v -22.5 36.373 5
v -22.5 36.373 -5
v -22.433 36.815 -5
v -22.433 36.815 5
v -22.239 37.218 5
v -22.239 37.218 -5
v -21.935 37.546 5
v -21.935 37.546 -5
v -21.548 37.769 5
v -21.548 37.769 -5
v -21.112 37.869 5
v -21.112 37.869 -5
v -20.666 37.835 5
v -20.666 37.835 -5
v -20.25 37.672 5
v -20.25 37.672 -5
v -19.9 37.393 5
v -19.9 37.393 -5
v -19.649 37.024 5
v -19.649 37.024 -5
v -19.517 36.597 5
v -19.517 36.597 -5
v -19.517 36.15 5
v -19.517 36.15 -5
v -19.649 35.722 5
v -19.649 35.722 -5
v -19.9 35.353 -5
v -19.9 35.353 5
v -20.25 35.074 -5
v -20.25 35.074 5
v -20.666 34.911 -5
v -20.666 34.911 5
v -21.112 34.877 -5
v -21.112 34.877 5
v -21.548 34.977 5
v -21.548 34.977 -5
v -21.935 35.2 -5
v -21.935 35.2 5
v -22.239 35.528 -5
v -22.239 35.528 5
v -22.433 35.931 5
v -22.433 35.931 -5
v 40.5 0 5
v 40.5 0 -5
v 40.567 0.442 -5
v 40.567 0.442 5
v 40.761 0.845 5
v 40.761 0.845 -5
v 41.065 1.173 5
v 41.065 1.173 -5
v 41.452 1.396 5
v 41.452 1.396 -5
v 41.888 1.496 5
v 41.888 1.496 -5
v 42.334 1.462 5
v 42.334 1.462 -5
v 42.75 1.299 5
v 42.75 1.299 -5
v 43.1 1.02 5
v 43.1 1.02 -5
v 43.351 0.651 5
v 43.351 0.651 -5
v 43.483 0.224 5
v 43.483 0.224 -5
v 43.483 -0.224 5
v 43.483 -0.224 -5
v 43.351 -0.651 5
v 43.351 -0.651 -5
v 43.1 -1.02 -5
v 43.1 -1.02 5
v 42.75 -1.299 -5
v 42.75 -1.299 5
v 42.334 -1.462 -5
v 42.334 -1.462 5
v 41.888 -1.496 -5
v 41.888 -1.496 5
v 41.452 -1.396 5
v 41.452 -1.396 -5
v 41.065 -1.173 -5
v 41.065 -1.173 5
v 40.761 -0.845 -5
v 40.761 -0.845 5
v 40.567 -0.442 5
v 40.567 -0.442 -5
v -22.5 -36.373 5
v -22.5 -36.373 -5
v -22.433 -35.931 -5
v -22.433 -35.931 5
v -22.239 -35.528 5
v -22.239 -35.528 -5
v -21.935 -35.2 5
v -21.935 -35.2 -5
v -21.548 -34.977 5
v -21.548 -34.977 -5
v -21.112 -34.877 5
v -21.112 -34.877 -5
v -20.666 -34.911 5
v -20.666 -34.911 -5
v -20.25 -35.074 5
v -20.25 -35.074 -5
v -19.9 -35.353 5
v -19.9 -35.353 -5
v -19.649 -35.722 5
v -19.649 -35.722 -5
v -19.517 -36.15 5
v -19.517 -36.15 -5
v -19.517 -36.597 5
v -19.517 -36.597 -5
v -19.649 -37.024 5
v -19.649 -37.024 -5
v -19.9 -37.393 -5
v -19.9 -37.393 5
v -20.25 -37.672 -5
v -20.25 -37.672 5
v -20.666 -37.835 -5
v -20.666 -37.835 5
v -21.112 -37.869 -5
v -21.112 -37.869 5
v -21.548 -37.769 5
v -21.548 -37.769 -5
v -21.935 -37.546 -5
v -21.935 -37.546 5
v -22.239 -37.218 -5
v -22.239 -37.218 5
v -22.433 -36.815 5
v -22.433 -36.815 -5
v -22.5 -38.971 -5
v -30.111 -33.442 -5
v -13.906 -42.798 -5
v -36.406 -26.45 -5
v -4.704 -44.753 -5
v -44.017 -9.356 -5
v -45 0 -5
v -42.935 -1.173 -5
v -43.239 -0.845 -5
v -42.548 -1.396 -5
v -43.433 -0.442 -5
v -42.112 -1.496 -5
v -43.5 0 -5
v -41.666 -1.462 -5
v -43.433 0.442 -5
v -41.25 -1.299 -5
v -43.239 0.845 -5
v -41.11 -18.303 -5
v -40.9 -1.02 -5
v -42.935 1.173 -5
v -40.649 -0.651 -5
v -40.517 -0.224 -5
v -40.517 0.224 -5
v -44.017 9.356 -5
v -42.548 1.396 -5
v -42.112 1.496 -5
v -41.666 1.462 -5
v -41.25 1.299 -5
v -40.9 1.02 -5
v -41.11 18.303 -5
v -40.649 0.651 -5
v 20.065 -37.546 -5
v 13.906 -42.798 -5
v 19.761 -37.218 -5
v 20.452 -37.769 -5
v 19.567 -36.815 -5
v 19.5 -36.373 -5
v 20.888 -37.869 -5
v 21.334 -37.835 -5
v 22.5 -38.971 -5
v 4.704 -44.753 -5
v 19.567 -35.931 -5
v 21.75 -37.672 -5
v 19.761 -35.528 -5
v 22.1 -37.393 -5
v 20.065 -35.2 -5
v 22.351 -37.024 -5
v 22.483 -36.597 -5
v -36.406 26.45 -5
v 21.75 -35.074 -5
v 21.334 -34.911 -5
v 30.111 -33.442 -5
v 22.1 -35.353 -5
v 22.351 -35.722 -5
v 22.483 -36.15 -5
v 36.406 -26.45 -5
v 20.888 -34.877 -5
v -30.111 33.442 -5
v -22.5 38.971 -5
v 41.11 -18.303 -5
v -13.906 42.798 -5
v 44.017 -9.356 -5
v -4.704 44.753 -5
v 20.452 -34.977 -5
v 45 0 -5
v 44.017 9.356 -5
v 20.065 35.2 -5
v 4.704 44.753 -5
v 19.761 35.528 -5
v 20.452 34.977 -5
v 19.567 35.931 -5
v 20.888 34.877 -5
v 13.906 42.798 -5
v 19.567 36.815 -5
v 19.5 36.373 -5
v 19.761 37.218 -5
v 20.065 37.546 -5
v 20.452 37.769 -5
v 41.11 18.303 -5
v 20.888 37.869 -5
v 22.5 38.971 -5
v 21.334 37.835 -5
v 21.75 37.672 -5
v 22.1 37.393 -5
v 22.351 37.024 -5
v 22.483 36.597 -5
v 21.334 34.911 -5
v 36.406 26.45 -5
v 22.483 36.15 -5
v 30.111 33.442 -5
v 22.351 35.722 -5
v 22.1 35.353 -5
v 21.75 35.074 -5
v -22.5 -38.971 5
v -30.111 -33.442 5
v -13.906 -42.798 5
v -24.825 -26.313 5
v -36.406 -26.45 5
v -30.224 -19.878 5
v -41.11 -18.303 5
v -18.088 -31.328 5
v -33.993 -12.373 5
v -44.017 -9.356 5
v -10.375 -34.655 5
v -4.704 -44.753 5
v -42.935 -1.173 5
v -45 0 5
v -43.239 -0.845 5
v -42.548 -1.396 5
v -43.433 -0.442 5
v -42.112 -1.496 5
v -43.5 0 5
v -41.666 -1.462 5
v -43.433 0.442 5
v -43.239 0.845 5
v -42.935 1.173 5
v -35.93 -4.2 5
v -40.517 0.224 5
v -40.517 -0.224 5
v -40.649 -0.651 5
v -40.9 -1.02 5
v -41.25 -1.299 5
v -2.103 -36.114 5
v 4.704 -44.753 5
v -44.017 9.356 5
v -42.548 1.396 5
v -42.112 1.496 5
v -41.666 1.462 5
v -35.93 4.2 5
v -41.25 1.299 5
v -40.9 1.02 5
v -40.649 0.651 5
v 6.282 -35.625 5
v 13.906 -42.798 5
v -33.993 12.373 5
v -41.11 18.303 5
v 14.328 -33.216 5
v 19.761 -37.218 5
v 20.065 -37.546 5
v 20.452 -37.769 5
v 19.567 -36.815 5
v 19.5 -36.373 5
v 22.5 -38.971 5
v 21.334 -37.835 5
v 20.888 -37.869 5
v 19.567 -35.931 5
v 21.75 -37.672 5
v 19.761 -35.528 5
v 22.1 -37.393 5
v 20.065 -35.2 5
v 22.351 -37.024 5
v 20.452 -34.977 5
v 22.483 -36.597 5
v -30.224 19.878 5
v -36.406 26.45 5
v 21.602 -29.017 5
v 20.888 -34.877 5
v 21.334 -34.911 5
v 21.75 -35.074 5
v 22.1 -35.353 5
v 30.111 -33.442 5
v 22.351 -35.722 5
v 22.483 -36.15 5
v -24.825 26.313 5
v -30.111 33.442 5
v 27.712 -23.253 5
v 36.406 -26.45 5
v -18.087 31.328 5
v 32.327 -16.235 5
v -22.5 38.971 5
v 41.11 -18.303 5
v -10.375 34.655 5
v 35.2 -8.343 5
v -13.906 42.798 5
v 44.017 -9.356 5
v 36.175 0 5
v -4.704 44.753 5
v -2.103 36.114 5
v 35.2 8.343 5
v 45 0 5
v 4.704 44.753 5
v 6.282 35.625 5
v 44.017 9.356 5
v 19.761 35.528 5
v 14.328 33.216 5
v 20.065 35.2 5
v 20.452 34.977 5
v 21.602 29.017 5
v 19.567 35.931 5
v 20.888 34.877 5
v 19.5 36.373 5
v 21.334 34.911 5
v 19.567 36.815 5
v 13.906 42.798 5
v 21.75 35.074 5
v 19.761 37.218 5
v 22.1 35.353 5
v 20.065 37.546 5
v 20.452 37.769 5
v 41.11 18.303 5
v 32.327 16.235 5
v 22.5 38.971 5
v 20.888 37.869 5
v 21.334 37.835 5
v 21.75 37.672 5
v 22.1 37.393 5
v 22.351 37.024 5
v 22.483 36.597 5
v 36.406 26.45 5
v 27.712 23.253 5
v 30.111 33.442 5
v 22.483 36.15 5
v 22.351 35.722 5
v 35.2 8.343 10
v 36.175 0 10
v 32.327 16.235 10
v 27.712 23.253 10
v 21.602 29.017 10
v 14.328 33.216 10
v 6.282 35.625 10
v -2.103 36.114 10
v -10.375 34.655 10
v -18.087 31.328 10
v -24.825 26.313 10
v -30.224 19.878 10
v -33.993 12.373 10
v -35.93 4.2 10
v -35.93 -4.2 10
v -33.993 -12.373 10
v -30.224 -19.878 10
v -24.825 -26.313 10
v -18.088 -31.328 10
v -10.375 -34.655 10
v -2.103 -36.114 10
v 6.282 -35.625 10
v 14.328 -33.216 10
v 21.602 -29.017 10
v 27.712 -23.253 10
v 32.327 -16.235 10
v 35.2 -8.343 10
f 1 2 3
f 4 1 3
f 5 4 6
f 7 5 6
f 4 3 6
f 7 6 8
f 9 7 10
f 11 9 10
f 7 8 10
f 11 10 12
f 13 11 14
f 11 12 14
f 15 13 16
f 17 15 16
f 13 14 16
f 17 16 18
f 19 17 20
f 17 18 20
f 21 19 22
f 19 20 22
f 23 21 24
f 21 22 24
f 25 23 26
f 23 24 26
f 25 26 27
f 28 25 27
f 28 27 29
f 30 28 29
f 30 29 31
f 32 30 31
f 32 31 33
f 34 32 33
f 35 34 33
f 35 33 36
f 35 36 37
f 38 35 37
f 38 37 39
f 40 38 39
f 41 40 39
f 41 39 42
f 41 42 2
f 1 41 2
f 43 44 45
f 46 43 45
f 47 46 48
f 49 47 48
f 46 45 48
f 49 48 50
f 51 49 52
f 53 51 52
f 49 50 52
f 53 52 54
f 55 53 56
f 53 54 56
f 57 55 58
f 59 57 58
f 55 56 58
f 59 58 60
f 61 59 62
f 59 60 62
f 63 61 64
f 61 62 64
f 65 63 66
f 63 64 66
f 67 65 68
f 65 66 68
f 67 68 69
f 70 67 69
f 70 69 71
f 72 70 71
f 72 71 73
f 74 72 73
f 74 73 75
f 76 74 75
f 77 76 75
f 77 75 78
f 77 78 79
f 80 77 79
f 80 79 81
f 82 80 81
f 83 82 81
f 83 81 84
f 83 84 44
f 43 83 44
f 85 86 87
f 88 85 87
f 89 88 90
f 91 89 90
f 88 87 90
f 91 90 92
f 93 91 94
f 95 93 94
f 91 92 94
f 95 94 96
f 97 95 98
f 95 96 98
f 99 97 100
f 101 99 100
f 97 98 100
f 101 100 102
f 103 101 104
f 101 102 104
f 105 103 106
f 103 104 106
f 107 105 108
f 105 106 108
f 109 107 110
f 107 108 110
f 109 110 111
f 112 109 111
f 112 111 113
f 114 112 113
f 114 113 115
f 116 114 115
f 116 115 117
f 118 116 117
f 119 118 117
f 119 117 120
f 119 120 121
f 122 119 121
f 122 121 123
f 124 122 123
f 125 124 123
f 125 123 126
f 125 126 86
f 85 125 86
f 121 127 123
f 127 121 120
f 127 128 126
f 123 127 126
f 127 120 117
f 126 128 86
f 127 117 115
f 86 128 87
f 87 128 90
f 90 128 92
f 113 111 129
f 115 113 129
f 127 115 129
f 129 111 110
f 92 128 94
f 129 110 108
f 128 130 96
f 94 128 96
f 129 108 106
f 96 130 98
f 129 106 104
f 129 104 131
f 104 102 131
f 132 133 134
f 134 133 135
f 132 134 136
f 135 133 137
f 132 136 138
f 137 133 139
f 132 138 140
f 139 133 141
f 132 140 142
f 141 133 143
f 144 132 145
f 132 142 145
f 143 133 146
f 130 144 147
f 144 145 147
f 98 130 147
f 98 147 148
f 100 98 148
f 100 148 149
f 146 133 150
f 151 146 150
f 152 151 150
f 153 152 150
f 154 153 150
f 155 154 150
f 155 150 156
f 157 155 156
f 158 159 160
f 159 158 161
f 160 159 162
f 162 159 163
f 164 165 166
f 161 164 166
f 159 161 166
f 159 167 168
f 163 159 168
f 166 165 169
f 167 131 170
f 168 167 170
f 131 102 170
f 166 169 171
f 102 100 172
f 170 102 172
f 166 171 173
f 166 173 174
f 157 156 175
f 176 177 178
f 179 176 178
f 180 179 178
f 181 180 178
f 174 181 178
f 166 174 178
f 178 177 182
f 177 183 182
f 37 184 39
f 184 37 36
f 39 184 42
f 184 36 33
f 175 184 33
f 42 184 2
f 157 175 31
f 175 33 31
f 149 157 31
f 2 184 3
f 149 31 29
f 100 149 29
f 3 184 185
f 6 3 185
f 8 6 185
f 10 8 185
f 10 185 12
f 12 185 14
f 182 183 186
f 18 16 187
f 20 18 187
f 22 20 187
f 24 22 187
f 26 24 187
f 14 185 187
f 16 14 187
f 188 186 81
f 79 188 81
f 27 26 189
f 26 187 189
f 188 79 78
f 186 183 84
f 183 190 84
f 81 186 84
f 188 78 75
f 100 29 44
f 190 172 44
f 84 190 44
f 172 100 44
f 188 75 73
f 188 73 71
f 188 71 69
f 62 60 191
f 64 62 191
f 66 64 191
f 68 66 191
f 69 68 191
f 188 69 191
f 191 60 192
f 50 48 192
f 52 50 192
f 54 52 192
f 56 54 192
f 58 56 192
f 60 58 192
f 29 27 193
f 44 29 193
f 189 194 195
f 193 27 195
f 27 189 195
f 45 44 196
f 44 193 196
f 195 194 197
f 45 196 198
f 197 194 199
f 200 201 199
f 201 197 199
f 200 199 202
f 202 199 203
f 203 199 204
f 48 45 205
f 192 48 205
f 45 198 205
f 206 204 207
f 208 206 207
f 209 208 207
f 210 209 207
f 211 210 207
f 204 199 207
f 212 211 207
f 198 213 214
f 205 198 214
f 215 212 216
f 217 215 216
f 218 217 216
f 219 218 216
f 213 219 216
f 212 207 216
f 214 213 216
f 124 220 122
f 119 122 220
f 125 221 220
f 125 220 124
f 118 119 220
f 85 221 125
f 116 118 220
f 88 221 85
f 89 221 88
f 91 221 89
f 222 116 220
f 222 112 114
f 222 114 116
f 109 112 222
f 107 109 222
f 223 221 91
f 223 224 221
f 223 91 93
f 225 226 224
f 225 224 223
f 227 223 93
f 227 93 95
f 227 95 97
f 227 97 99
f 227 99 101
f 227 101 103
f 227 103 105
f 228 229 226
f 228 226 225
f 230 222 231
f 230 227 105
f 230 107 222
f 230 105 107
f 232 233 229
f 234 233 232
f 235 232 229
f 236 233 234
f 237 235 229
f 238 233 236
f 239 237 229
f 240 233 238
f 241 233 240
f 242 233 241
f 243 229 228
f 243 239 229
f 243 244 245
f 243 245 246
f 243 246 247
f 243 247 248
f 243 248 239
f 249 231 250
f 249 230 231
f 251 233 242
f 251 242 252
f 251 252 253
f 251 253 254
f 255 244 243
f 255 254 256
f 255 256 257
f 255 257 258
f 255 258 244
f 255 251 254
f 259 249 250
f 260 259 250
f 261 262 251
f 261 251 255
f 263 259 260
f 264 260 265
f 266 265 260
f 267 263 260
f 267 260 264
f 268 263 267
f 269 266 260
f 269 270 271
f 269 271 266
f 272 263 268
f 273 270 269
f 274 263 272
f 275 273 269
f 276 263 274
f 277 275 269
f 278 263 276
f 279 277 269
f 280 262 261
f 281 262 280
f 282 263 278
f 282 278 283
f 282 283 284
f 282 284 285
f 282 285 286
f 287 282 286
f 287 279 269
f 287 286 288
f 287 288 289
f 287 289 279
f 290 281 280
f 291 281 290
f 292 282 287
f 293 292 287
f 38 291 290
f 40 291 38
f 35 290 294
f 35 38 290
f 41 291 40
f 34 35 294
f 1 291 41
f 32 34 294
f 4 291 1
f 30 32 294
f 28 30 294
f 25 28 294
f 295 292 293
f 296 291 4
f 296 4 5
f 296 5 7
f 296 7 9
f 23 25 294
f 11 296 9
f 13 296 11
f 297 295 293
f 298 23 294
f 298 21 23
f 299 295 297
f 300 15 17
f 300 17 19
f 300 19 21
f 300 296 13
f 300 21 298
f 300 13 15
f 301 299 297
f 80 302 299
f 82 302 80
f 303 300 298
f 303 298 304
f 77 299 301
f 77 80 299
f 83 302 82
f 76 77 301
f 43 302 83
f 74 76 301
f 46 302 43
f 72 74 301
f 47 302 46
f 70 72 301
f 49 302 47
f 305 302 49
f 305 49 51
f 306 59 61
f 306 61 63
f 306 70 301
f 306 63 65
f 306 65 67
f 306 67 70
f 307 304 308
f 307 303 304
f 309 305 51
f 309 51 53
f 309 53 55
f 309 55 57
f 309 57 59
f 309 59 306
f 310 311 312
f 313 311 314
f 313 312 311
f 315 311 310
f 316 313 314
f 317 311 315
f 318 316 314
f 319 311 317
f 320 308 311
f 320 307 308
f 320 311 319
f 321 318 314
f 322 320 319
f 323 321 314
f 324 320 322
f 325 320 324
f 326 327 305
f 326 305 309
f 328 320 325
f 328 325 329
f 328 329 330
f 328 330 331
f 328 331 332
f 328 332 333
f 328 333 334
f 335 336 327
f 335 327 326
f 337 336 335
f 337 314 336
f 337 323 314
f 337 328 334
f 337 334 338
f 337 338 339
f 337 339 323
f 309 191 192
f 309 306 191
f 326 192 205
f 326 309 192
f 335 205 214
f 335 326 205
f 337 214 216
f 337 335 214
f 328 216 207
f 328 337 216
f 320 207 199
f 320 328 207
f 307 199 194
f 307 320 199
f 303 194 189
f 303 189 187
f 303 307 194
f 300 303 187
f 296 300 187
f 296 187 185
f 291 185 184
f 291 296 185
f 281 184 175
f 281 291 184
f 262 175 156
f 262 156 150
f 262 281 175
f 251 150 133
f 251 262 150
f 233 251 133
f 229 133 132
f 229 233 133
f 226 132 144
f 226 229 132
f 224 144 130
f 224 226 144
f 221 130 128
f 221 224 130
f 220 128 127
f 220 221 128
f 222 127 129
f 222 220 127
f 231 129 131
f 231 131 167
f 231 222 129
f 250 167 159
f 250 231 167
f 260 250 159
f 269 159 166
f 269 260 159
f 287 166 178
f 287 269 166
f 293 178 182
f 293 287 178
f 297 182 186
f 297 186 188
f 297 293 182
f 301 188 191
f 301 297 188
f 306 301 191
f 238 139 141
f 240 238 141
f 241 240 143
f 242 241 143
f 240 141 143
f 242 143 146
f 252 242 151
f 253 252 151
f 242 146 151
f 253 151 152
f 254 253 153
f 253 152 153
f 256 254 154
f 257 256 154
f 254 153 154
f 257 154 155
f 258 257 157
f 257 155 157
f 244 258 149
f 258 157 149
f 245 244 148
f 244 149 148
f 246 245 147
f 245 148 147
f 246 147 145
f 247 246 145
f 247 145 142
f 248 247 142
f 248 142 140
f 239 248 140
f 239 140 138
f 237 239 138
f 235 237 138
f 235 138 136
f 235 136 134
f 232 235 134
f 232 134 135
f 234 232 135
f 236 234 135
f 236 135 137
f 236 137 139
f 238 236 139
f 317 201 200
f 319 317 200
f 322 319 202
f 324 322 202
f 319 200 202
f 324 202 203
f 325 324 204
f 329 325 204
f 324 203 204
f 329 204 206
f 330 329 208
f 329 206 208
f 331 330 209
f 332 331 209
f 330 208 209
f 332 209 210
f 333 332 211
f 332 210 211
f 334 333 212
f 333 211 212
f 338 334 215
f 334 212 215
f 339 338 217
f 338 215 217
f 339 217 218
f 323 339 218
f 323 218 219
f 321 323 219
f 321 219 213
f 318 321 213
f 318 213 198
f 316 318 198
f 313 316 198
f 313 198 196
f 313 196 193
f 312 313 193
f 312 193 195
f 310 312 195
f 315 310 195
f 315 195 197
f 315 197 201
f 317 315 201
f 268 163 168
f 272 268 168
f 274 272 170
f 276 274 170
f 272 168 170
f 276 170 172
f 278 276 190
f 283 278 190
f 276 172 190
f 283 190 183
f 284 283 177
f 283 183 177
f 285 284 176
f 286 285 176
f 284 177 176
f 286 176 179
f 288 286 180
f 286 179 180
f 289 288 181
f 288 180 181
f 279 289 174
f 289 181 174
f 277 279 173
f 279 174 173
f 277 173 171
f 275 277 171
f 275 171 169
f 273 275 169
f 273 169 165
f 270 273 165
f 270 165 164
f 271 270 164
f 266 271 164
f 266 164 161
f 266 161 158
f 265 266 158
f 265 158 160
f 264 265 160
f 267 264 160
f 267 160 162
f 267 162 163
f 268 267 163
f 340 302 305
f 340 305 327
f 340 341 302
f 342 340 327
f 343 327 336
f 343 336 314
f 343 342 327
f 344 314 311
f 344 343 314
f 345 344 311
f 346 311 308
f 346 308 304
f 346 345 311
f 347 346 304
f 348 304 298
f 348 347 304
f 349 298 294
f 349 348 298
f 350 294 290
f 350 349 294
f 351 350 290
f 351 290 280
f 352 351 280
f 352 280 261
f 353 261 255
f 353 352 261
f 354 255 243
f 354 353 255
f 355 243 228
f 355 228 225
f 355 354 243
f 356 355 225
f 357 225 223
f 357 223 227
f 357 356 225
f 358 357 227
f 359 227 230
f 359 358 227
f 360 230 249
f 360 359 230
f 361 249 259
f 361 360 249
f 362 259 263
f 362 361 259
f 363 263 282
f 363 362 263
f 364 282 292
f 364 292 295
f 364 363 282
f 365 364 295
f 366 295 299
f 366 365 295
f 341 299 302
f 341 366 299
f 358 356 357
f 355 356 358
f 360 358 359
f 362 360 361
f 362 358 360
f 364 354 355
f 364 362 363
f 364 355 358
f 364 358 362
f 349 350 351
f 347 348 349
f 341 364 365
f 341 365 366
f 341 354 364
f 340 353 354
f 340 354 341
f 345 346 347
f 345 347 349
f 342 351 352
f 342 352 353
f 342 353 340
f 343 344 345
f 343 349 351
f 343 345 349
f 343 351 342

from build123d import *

# Parameters (mm, degrees)
SKETCH1_R           = 45
BOSS_EXTRUDE1_DEPTH = 5
SKETCH2_R           = 36.175
BOSS_EXTRUDE2_DEPTH = 5
SKETCH4_R           = 1.5
CUT_EXTRUDE2_DEPTH  = 66.383484153


with BuildPart() as part:
    # Sketch1 → Boss-Extrude1 (new, symmetric)
    with BuildSketch(Plane.XY):
        Circle(SKETCH1_R)
    extrude(amount=BOSS_EXTRUDE1_DEPTH, both=True)

    # Sketch2 → Boss-Extrude2 (add, symmetric)
    with BuildSketch(Plane.XY.offset(5)):
        Circle(SKETCH2_R)
    extrude(amount=BOSS_EXTRUDE2_DEPTH, both=True)

    # Sketch4 → Cut-Extrude2 (cut, through all)
    with BuildSketch(Plane(origin=(0, 0, -5), x_dir=(-1, 0, 0), z_dir=(0, 0, -1))):
        with Locations((-42, 0)):
            Circle(SKETCH4_R)
        with Locations((-21, 36.373066959)):
            Circle(SKETCH4_R)
        with Locations((21, 36.373066959)):
            Circle(SKETCH4_R)
        with Locations((42, 0)):
            Circle(SKETCH4_R)
        with Locations((21, -36.373066959)):
            Circle(SKETCH4_R)
        with Locations((-21, -36.373066959)):
            Circle(SKETCH4_R)
    extrude(amount=-CUT_EXTRUDE2_DEPTH, mode=Mode.SUBTRACT)


solid = part.part
